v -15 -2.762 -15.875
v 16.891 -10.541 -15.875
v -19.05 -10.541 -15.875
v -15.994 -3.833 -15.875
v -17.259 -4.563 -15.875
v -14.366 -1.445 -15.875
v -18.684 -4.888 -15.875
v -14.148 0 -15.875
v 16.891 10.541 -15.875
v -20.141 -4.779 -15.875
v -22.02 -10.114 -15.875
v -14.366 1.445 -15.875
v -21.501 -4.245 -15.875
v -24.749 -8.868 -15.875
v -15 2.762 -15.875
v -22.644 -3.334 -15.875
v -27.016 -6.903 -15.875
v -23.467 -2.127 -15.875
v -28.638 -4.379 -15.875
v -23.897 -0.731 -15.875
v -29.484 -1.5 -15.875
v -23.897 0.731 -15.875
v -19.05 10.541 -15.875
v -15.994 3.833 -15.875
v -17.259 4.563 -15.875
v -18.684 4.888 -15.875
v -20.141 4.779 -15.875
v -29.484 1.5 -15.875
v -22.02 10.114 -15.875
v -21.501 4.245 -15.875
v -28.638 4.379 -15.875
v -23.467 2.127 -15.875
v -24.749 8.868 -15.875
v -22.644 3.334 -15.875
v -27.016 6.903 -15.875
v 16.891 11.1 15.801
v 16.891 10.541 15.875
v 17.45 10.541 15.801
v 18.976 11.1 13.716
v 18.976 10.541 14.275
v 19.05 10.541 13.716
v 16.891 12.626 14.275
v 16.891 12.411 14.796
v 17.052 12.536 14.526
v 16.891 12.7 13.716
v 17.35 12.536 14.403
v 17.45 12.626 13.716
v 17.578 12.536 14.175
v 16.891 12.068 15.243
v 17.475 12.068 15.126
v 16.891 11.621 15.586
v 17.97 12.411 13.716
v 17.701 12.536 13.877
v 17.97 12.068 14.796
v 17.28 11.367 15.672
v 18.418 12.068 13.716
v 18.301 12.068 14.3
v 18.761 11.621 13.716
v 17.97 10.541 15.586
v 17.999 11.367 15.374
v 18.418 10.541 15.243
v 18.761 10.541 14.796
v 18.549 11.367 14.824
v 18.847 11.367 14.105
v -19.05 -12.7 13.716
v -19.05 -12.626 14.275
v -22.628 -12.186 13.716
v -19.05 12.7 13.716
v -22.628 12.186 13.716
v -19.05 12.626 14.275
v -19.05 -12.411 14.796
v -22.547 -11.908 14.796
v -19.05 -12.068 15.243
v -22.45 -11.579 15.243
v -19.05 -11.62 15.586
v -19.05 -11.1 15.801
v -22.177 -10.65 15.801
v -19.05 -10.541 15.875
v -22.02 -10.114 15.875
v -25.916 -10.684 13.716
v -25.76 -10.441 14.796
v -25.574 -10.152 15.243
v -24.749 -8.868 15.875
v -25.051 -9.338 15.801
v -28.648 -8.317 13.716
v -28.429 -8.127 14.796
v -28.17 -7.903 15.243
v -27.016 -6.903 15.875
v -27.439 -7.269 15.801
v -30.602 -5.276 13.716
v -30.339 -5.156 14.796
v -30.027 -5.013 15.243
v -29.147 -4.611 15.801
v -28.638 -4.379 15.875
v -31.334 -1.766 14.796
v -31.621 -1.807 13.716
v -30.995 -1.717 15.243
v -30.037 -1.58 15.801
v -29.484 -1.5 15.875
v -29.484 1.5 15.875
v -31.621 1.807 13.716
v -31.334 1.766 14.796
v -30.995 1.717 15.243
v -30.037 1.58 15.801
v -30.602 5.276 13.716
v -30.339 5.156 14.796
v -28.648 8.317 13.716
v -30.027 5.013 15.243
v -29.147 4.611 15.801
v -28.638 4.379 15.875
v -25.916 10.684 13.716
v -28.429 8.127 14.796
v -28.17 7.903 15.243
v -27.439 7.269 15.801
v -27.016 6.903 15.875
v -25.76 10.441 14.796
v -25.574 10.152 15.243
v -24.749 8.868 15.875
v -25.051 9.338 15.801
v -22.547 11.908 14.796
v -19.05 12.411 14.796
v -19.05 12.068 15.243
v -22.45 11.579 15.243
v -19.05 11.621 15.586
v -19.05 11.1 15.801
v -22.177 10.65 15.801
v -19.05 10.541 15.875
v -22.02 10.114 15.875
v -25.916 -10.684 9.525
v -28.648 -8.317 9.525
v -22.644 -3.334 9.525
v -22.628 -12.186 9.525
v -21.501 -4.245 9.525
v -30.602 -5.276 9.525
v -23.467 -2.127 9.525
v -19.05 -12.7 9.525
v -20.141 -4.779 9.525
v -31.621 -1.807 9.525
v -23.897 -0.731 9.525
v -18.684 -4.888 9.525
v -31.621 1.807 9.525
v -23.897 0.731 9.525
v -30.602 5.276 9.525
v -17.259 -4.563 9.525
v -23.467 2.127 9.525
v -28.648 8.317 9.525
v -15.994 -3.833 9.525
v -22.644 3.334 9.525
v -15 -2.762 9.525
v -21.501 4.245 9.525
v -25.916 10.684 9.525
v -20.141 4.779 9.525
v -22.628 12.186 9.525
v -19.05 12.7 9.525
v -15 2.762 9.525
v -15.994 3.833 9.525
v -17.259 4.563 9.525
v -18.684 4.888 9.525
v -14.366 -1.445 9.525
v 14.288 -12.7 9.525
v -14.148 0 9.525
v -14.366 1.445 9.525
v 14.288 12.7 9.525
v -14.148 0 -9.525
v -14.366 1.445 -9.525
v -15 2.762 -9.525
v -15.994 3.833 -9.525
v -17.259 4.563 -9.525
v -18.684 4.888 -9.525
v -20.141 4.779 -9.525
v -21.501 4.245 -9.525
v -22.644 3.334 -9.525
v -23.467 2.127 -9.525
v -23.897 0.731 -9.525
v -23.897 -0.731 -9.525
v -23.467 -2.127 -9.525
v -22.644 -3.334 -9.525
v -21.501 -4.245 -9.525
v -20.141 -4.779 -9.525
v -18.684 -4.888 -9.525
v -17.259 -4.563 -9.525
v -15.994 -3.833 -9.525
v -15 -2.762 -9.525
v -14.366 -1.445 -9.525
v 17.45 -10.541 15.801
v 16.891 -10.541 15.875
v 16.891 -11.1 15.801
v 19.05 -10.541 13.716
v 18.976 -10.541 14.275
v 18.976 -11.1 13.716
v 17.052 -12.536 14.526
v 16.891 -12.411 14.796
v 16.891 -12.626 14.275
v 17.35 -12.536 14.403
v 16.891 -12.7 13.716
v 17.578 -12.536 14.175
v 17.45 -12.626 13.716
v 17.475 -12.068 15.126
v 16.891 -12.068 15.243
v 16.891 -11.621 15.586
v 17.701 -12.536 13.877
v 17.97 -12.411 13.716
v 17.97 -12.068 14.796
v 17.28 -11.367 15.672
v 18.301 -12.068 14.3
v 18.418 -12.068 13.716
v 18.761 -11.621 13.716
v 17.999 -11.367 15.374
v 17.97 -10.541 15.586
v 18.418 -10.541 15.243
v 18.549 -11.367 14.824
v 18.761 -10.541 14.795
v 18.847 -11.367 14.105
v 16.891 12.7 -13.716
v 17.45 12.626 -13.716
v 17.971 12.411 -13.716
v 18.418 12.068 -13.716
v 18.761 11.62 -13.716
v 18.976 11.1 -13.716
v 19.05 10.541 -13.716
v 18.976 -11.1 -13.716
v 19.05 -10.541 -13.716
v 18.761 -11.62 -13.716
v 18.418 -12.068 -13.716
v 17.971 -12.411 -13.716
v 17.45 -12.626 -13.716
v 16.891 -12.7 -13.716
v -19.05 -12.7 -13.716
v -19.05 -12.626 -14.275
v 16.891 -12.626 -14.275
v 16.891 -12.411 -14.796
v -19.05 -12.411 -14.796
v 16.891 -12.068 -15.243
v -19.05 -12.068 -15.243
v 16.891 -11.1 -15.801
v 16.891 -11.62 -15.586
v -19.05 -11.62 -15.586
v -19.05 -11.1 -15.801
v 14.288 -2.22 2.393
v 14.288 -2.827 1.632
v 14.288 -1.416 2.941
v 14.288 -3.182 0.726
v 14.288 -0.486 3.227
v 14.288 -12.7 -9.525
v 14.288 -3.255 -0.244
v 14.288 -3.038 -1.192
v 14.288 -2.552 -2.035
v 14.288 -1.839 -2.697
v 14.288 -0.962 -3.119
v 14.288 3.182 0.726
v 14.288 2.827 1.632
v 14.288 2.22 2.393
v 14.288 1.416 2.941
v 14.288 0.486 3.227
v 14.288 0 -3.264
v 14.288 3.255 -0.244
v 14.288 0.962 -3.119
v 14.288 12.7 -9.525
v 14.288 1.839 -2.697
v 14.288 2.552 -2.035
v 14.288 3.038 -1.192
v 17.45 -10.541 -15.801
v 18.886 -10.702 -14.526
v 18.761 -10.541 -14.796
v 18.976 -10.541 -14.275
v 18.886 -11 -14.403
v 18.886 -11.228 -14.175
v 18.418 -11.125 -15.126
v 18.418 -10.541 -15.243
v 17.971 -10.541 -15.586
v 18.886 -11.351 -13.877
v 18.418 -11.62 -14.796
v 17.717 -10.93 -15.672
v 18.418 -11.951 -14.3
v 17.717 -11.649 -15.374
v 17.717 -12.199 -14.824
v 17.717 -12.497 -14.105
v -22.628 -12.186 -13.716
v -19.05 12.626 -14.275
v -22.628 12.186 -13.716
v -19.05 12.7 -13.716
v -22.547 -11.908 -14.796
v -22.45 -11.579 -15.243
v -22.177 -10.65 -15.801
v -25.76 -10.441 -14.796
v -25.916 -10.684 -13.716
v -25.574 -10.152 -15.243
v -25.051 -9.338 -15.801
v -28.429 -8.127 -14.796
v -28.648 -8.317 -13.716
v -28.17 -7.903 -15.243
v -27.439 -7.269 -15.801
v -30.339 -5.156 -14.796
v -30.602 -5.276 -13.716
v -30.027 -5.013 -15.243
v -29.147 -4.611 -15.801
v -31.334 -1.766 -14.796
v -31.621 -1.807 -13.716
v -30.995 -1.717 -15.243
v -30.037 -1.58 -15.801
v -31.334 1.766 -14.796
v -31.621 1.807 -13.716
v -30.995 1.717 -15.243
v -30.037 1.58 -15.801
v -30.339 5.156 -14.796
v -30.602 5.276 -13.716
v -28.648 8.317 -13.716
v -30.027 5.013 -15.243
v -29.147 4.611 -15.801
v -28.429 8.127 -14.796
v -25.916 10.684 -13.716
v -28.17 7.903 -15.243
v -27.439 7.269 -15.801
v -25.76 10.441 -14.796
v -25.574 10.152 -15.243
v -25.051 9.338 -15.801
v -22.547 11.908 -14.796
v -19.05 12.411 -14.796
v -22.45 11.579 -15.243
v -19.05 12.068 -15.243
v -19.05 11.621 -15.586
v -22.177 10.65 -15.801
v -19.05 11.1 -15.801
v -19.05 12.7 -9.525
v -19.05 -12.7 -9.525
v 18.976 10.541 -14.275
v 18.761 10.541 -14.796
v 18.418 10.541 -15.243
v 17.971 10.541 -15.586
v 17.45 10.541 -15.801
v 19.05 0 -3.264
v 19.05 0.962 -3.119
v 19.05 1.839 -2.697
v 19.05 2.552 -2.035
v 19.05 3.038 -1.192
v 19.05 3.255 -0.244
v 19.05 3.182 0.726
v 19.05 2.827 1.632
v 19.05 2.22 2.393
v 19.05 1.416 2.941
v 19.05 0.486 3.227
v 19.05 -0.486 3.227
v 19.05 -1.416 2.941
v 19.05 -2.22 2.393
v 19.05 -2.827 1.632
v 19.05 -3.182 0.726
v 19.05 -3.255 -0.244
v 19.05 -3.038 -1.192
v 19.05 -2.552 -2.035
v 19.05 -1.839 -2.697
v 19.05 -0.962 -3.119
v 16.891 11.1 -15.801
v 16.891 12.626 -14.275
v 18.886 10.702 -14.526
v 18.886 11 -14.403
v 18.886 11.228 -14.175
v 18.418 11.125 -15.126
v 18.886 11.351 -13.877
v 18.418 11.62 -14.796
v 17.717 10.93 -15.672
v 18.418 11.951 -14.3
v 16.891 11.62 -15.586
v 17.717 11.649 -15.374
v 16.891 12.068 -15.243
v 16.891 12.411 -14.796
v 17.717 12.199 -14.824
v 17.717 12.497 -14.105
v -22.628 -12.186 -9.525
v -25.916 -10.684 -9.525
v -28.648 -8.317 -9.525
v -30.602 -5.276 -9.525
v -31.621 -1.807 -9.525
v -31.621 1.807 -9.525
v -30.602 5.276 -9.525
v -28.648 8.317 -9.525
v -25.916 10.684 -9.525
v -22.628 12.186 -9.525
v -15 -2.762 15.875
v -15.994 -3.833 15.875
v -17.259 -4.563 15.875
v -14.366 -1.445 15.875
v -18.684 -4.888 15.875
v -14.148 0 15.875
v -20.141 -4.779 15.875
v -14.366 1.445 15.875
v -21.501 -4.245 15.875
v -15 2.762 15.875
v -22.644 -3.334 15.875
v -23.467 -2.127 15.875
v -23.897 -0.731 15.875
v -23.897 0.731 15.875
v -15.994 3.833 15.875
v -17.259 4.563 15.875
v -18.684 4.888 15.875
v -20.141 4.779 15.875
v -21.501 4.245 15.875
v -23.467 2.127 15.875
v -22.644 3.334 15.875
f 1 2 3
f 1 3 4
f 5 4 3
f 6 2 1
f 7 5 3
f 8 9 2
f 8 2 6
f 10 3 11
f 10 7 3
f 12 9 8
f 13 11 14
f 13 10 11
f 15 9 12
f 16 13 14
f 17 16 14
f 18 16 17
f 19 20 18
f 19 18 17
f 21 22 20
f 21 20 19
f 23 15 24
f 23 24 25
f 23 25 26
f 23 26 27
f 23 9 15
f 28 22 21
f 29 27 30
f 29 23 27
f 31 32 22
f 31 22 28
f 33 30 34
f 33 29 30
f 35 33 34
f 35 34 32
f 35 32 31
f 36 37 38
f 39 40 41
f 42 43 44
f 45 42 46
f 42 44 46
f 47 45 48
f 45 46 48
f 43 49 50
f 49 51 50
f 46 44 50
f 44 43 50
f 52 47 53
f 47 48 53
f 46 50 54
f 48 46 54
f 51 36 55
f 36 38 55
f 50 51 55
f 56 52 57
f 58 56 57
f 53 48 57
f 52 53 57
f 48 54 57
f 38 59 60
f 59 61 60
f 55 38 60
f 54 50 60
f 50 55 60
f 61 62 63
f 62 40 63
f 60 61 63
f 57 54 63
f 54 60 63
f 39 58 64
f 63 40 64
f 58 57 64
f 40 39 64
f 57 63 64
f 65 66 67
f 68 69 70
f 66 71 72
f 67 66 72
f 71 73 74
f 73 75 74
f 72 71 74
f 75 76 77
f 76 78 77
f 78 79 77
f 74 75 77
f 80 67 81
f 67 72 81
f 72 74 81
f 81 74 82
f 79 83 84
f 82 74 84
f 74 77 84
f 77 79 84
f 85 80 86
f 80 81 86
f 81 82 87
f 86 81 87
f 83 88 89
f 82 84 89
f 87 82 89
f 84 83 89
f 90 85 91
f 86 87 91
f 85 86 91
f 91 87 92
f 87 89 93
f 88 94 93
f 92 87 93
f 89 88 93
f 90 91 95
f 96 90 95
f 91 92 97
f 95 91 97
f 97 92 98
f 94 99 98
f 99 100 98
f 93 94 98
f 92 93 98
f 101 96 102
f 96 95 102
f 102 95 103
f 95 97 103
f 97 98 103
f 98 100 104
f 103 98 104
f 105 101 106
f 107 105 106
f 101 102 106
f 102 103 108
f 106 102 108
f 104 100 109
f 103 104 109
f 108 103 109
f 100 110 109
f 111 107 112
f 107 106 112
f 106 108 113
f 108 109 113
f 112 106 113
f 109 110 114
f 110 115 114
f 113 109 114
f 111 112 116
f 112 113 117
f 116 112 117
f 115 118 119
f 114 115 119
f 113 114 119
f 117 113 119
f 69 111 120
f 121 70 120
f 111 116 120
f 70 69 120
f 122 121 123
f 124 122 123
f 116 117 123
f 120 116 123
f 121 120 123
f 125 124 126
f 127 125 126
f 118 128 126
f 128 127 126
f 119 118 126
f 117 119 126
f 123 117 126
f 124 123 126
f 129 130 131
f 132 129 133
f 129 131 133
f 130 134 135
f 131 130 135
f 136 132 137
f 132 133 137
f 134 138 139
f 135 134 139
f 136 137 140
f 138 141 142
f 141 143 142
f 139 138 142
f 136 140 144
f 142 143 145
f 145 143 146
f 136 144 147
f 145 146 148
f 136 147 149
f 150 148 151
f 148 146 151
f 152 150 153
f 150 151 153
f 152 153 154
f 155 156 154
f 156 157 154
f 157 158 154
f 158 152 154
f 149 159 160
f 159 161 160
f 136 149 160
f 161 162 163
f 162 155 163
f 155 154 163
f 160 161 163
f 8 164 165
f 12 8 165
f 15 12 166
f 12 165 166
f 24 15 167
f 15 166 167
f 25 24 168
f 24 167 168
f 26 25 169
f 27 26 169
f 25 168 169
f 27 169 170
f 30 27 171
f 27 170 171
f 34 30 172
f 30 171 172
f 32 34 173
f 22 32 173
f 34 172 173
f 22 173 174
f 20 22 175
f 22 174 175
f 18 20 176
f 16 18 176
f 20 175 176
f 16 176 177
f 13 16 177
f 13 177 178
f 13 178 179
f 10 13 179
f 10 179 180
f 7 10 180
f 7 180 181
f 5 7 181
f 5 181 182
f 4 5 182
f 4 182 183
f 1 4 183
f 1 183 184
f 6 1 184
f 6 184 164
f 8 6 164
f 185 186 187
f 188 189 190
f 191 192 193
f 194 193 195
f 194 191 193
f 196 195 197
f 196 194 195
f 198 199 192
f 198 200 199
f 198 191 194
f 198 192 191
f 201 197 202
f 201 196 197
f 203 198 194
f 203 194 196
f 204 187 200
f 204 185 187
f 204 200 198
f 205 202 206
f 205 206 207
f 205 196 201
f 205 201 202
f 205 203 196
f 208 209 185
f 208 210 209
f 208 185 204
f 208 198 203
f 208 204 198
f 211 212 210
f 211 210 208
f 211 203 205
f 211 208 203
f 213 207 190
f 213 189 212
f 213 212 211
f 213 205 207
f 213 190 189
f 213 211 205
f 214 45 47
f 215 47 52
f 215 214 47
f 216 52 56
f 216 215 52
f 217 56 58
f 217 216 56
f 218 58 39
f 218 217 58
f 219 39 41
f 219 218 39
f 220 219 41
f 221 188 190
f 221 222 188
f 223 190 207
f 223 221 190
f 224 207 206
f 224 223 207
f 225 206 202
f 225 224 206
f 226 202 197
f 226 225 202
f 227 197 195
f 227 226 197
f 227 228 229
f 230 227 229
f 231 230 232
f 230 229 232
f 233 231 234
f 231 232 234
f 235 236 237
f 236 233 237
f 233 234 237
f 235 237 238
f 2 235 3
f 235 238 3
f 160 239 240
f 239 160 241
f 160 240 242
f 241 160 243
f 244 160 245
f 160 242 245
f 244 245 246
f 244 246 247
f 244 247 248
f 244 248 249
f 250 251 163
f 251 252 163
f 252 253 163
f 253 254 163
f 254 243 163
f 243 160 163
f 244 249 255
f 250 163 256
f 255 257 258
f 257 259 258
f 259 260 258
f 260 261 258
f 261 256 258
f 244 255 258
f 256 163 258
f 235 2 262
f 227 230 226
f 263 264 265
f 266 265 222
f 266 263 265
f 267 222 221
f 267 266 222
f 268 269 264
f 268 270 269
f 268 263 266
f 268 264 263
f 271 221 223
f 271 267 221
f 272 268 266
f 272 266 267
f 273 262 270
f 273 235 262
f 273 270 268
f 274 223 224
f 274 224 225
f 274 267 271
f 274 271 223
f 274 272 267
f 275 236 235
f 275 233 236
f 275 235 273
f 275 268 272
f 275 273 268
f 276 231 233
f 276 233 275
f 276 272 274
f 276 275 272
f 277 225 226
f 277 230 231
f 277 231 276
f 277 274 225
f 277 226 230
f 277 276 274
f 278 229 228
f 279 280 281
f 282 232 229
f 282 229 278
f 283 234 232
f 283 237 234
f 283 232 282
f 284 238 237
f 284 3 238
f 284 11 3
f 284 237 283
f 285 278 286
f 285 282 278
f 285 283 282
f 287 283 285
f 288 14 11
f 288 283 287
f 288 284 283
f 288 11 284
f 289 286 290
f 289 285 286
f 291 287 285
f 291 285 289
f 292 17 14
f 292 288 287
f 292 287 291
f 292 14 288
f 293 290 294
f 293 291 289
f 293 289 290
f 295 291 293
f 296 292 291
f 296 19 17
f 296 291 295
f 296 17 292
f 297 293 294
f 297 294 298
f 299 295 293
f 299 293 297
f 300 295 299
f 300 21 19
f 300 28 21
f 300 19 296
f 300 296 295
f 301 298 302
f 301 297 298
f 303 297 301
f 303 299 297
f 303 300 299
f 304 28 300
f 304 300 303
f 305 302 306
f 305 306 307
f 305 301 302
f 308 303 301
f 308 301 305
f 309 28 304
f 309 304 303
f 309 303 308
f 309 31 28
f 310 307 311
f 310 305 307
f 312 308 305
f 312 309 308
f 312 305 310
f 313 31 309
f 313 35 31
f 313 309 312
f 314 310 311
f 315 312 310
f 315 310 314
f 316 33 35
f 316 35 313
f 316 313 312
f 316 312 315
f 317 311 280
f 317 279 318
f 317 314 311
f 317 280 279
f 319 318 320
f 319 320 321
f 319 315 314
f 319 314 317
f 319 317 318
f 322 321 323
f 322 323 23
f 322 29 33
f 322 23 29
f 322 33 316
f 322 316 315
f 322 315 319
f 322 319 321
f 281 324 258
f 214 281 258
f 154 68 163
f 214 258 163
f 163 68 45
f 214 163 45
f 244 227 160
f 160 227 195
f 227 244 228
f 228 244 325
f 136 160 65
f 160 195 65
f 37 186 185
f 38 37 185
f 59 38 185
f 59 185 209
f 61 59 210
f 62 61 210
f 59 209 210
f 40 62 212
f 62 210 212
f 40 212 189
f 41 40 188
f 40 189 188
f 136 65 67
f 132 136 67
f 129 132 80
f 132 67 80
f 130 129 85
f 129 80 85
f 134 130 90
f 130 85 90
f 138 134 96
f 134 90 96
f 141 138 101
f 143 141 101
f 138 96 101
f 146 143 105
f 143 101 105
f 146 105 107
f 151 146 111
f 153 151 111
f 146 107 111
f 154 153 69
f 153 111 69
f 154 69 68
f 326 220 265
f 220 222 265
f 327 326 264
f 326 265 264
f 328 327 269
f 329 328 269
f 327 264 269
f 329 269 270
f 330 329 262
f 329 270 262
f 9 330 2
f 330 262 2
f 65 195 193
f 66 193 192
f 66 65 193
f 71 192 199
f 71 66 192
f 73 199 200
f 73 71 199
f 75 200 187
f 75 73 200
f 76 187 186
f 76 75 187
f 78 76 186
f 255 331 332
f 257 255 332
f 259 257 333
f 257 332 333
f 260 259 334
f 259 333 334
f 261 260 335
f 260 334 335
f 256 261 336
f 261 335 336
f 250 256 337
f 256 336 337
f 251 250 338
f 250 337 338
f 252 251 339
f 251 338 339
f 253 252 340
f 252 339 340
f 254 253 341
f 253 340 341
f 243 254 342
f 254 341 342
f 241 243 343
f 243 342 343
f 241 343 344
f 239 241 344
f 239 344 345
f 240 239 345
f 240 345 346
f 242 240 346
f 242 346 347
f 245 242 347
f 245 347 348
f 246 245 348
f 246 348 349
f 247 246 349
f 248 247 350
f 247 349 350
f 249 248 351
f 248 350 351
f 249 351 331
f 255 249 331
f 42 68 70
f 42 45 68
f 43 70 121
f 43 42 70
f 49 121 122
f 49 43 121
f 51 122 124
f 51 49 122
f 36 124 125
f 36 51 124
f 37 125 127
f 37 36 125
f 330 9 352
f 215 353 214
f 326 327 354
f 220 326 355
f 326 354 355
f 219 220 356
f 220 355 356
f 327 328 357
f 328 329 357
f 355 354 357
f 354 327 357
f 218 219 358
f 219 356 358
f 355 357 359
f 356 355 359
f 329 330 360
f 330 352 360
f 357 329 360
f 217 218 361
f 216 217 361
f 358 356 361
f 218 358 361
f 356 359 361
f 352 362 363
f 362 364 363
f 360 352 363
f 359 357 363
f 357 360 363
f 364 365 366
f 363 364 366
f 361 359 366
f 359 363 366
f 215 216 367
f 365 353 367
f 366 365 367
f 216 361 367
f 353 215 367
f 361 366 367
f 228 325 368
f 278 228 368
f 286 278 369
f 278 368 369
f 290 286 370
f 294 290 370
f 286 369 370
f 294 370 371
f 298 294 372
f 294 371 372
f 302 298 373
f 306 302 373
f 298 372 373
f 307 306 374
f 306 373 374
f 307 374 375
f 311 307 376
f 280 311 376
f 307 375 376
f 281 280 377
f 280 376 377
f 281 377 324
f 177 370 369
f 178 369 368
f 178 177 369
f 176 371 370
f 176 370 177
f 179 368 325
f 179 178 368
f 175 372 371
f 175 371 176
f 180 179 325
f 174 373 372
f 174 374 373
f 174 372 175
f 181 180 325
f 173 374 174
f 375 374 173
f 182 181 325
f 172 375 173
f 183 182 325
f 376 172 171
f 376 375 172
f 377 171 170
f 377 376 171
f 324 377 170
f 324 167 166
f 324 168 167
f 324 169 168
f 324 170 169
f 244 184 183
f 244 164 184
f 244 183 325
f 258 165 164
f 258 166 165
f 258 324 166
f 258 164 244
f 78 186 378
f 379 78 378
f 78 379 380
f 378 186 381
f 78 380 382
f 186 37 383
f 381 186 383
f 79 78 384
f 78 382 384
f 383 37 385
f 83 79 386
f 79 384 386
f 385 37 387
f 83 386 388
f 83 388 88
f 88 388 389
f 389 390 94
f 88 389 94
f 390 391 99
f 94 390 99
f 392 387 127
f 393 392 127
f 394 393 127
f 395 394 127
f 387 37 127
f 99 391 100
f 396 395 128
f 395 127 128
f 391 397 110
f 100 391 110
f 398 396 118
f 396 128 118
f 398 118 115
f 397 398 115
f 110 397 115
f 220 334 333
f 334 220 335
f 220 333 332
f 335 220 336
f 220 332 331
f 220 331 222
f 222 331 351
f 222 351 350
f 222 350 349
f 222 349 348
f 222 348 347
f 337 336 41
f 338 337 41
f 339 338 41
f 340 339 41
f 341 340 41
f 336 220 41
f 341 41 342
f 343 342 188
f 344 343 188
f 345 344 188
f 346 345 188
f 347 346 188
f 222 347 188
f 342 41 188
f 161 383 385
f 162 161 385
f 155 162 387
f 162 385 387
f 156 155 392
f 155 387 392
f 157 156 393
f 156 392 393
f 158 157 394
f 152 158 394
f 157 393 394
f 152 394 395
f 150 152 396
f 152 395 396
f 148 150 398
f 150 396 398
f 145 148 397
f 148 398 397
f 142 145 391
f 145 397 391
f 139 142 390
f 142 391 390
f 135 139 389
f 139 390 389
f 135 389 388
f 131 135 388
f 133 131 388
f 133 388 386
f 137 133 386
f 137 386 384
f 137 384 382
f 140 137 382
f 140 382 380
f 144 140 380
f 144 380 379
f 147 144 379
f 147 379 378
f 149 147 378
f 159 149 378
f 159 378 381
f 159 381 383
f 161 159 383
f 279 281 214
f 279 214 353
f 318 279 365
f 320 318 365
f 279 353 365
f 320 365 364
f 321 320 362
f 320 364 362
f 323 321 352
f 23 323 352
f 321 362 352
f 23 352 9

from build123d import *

# Parameters (mm, degrees)
BOSS_EXTRUDE1_DEPTH = 15.875
SKETCH3_R           = 4.9022
CUT_EXTRUDE1_DEPTH  = 47.6627796
SKETCH4_W           = 46.0375
SKETCH4_H           = 19.05
CUT_EXTRUDE2_DEPTH  = 44.649033494
SKETCH5_R           = 3.2639
CUT_EXTRUDE3_DEPTH  = 4.7625
FILLET1_R           = 2.159


with BuildPart() as part:
    # Sketch1 → Boss-Extrude1 (new, symmetric)
    with BuildSketch(Plane.XY):
        with BuildLine():
            Line((-19.05, 12.7), (19.05, 12.7))
            Line((19.05, 12.7), (19.05, -12.7))
            Line((19.05, -12.7), (-19.05, -12.7))
            ThreePointArc((-19.05, -12.7), (-31.75, 0), (-19.05, 12.7))
        make_face()
    extrude(amount=BOSS_EXTRUDE1_DEPTH, both=True)

    # Sketch3 → Cut-Extrude1 (cut, through all)
    with BuildSketch(Plane.XY.offset(15.875)):
        with Locations((-19.05, 0)):
            Circle(SKETCH3_R)
    extrude(amount=-CUT_EXTRUDE1_DEPTH, mode=Mode.SUBTRACT)

    # Sketch4 → Cut-Extrude2 (cut, through all)
    with BuildSketch(Plane(origin=(0, 12.7, 0), x_dir=(1, 0, 0), z_dir=(0, 1, 0))):
        with Locations((-8.73125, 0)):
            Rectangle(SKETCH4_W, SKETCH4_H)
    extrude(amount=-CUT_EXTRUDE2_DEPTH, mode=Mode.SUBTRACT)

    # Sketch5 → Cut-Extrude3 (cut)
    with BuildSketch(Plane(origin=(19.05, 0, 0), x_dir=(0, 0, -1), z_dir=(1, 0, 0))):
        Circle(SKETCH5_R)
    extrude(amount=-CUT_EXTRUDE3_DEPTH, mode=Mode.SUBTRACT)

    # Fillet1
    fillet1_edges = [part.edges().sort_by_distance(p)[0] for p in [
        (19.05, 0, 15.875),
        (0, 12.7, 15.875),
        (-31.75, 0, 15.875),
        (0, 12.7, -15.875),
        (19.05, 0, -15.875),
        (0, -12.7, -15.875),
        (-31.75, 0, -15.875),
        (19.05, 12.7, 0),
        (19.05, -12.7, 0),
        (0, -12.7, 15.875),
    ]]
    fillet(fillet1_edges, radius=FILLET1_R)


solid = part.part
